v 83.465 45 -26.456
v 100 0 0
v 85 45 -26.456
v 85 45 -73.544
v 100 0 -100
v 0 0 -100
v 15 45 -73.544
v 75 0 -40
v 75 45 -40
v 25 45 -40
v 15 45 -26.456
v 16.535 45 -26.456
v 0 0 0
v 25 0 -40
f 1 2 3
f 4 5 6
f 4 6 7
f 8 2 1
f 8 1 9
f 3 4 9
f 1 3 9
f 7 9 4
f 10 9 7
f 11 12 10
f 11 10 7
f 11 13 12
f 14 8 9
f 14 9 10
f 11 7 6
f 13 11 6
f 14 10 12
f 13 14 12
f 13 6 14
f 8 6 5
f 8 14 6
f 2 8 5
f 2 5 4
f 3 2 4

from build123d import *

# Parameters (mm, degrees)
GRUNDK_RPER_DEPTH               = 100
SCHRAEGEN_VORNE_DEPTH           = 100
SCHNITT_LINEAR_AUSTRAGEN4_DEPTH = 45


with BuildPart() as part:
    # Skizze1 → Grundkörper (new body)
    with BuildSketch(Plane.XY):
        Polygon((0, 0), (100, 0), (85, 45), (15, 45), align=None)
    extrude(amount=-GRUNDK_RPER_DEPTH)

    # Skizze2 → Schraegen_vorne (cut)
    with BuildSketch(Plane(origin=(0, 0, 0), x_dir=(0, 0, -1), z_dir=(1, 0, 0))):
        Polygon((100, 0), (73.544212344, 45), (100, 45), align=None)
    schraegen_vorne = extrude(amount=SCHRAEGEN_VORNE_DEPTH, mode=Mode.SUBTRACT)

    # Spiegel_Schraege_hinten: Schraegen_vorne across plane
    add(schraegen_vorne.mirror(Plane.XY.offset(-50)), mode=Mode.SUBTRACT)

    # Skizze4 → Schnitt-Linear austragen4 (cut)
    with BuildSketch(Plane.XZ):
        Polygon((100, 0), (75, -40), (25, -40), (0, 0), align=None)
    extrude(amount=-SCHNITT_LINEAR_AUSTRAGEN4_DEPTH, mode=Mode.SUBTRACT)


solid = part.part
